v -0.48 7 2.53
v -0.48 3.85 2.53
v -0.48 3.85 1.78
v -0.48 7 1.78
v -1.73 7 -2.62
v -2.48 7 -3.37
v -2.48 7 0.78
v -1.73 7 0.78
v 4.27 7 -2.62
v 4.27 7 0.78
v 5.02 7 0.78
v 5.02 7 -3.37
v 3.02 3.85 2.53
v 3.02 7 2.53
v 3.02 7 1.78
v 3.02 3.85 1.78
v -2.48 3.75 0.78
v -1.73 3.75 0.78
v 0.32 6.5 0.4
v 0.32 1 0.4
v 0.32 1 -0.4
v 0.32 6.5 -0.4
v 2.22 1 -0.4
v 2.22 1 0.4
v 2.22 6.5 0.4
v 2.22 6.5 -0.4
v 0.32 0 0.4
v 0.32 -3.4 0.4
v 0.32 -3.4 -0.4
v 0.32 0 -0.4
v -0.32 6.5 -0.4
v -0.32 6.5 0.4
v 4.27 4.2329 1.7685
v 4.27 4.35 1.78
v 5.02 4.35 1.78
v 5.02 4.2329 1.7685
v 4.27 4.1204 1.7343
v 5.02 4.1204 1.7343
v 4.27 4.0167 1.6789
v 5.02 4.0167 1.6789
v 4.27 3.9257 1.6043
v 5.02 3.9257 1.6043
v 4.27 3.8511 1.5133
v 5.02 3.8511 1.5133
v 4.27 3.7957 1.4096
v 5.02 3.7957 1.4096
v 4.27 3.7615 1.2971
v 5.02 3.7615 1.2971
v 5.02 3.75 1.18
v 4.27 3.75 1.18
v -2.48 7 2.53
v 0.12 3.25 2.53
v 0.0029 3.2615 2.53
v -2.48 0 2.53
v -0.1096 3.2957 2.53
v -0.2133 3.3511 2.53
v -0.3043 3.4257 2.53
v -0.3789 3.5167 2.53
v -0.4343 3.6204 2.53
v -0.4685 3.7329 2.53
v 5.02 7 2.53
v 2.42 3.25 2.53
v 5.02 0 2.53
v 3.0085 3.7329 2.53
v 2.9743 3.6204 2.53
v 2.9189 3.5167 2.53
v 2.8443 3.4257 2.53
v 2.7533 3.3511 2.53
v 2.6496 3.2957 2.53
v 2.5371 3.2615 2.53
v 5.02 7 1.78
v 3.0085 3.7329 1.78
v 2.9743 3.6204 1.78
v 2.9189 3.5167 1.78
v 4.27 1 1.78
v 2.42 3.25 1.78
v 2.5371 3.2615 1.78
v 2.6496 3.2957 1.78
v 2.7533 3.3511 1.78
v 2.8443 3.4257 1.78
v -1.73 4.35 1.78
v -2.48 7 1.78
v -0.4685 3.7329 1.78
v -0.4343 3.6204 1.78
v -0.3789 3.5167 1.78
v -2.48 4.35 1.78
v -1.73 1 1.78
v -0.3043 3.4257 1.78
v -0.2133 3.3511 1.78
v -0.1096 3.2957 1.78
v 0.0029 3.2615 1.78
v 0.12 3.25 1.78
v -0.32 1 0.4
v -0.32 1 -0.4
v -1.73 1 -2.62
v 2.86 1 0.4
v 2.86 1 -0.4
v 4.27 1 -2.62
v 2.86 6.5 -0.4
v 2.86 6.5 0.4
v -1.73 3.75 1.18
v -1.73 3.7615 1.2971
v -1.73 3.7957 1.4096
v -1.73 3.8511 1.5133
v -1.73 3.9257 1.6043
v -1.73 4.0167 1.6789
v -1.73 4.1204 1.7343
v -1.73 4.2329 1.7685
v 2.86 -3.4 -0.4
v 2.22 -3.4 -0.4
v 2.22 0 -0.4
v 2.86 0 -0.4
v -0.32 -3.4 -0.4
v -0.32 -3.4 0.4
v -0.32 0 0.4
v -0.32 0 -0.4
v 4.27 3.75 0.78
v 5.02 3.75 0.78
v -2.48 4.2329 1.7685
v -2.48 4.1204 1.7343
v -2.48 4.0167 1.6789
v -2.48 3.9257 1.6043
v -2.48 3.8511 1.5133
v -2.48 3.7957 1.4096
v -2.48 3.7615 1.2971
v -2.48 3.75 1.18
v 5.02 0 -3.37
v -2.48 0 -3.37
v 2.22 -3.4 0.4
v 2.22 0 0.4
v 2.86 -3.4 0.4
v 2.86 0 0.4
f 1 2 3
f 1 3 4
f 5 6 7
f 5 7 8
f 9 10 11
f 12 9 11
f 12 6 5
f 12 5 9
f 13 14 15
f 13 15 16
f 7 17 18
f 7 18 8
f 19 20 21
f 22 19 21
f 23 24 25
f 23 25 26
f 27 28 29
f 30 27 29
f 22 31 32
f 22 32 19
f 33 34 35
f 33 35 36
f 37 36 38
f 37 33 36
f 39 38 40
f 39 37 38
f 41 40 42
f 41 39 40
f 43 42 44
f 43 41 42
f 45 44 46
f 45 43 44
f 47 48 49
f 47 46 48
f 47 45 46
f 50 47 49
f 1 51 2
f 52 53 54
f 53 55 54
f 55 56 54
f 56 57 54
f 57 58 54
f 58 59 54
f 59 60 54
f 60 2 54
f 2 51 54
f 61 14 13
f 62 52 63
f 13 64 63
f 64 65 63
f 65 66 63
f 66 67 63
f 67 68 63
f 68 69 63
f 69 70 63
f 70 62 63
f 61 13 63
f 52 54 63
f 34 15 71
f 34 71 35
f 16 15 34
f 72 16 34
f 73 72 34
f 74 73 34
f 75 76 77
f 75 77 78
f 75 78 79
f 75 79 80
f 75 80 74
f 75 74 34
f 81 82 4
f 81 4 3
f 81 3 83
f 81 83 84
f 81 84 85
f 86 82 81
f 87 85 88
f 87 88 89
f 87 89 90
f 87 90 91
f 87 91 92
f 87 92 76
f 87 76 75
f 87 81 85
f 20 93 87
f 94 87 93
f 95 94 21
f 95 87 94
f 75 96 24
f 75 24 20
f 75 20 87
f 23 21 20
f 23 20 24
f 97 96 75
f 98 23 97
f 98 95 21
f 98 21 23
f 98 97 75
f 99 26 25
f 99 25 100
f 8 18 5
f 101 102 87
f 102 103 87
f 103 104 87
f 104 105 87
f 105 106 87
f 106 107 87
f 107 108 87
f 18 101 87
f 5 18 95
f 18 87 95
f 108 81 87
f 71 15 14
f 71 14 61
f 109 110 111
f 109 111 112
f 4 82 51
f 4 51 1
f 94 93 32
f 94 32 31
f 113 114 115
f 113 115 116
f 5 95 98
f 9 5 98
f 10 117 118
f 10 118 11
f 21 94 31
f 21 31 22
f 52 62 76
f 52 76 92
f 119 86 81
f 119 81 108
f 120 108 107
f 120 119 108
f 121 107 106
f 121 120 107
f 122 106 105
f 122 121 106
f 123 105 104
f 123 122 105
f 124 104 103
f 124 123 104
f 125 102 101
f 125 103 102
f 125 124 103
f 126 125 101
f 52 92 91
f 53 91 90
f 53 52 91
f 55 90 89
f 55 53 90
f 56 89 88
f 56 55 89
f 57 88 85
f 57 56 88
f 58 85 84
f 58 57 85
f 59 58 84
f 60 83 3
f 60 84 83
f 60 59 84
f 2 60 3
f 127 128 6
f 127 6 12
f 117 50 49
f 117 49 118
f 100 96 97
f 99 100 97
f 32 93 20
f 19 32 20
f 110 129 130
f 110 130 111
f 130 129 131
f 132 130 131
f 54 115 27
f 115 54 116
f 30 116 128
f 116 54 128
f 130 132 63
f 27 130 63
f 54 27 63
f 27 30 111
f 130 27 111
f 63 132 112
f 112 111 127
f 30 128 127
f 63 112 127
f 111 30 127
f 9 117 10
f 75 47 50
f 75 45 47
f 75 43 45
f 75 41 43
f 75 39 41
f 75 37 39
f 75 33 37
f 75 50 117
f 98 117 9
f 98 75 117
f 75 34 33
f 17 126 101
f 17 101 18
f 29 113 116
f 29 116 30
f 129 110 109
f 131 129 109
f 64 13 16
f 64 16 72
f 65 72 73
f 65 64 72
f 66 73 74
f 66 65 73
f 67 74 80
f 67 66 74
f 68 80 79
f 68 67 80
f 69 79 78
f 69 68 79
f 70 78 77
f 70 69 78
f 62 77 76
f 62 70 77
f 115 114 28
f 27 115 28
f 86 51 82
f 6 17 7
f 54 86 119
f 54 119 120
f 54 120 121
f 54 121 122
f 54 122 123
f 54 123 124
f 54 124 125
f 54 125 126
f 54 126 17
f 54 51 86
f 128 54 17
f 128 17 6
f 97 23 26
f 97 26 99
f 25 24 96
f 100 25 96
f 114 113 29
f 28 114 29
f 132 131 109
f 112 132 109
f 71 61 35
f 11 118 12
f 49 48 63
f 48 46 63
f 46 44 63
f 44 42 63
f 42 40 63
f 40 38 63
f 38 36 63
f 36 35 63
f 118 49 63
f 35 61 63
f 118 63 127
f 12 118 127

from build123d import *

# Parameters (mm, degrees)
CROQUIS1_W                   = 7.5
CROQUIS1_H                   = 5.9
CROQUIS1_W_2                 = 0.64
CROQUIS1_H_2                 = 0.8
SALIENTE_EXTRUIR1_DEPTH      = 1
CROQUIS2_W                   = 7.5
CROQUIS2_H                   = 5.9
CROQUIS2_W_2                 = 6
CROQUIS2_H_2                 = 4.4
SALIENTE_EXTRUIR2_DEPTH      = 6
CORTAR_EXTRUIR1_DEPTH        = 9
CORTAR_EXTRUIR2_DEPTH        = 2
SALIENTE_EXTRUIR3_DEPTH      = 6.5
SALIENTE_EXTRUIR3_DEPTH_BACK = 3.4
CROQUIS5_W                   = 0.64
CROQUIS5_H                   = 0.8


with BuildPart() as part:
    # Croquis1 → Saliente-Extruir1 (new body)
    with BuildSketch(Plane(origin=(0, 0, 0), x_dir=(1, 0, 0), z_dir=(0, 1, 0))):
        with Locations((1.27, 0.42)):
            Rectangle(CROQUIS1_W, CROQUIS1_H)
        Rectangle(CROQUIS1_W_2, CROQUIS1_H_2, mode=Mode.SUBTRACT)
        with Locations((2.54, 0)):
            Rectangle(CROQUIS1_W_2, CROQUIS1_H_2, mode=Mode.SUBTRACT)
    extrude(amount=SALIENTE_EXTRUIR1_DEPTH)

    # Croquis2 → Saliente-Extruir2 (add)
    with BuildSketch(Plane(origin=(0, 1, 0), x_dir=(1, 0, 0), z_dir=(0, 1, 0))):
        with Locations((1.27, 0.42)):
            Rectangle(CROQUIS2_W, CROQUIS2_H)
        with Locations((1.27, 0.42)):
            Rectangle(CROQUIS2_W_2, CROQUIS2_H_2, mode=Mode.SUBTRACT)
    extrude(amount=SALIENTE_EXTRUIR2_DEPTH)

    # Croquis3 → Cortar-Extruir1 (cut)
    with BuildSketch(Plane.ZY.offset(2.48)):
        with BuildLine():
            Line((1.78, 7), (1.78, 4.35))
            ThreePointArc((1.78, 4.35), (1.604264069, 3.925735931), (1.18, 3.75))
            Line((1.18, 3.75), (0.78, 3.75))
            Line((0.78, 3.75), (0.78, 7))
            Line((0.78, 7), (1.78, 7))
        make_face()
    extrude(amount=-CORTAR_EXTRUIR1_DEPTH, mode=Mode.SUBTRACT)

    # Croquis4 → Cortar-Extruir2 (cut)
    with BuildSketch(Plane.XY.offset(2.53)):
        with BuildLine():
            Line((-0.48, 3.85), (-0.48, 7))
            Line((-0.48, 7), (3.02, 7))
            Line((3.02, 7), (3.02, 3.85))
            ThreePointArc((3.02, 3.85), (2.844264069, 3.425735931), (2.42, 3.25))
            Line((2.42, 3.25), (1.266494324, 3.25))
            Line((1.266494324, 3.25), (0.12, 3.25))
            ThreePointArc((0.12, 3.25), (-0.304264069, 3.425735931), (-0.48, 3.85))
        make_face()
    extrude(amount=-CORTAR_EXTRUIR2_DEPTH, mode=Mode.SUBTRACT)

    # Croquis5 → Saliente-Extruir3 (add, two sides: drawn at the far end of the back side and taken through both)
    with BuildSketch(Plane(origin=(0, 0, 0), x_dir=(1, 0, 0), z_dir=(0, 1, 0)).offset(-SALIENTE_EXTRUIR3_DEPTH_BACK)):
        with Locations((2.54, 0)):
            Rectangle(CROQUIS5_W, CROQUIS5_H)
        Rectangle(CROQUIS5_W, CROQUIS5_H)
    extrude(amount=SALIENTE_EXTRUIR3_DEPTH + SALIENTE_EXTRUIR3_DEPTH_BACK)


solid = part.part
